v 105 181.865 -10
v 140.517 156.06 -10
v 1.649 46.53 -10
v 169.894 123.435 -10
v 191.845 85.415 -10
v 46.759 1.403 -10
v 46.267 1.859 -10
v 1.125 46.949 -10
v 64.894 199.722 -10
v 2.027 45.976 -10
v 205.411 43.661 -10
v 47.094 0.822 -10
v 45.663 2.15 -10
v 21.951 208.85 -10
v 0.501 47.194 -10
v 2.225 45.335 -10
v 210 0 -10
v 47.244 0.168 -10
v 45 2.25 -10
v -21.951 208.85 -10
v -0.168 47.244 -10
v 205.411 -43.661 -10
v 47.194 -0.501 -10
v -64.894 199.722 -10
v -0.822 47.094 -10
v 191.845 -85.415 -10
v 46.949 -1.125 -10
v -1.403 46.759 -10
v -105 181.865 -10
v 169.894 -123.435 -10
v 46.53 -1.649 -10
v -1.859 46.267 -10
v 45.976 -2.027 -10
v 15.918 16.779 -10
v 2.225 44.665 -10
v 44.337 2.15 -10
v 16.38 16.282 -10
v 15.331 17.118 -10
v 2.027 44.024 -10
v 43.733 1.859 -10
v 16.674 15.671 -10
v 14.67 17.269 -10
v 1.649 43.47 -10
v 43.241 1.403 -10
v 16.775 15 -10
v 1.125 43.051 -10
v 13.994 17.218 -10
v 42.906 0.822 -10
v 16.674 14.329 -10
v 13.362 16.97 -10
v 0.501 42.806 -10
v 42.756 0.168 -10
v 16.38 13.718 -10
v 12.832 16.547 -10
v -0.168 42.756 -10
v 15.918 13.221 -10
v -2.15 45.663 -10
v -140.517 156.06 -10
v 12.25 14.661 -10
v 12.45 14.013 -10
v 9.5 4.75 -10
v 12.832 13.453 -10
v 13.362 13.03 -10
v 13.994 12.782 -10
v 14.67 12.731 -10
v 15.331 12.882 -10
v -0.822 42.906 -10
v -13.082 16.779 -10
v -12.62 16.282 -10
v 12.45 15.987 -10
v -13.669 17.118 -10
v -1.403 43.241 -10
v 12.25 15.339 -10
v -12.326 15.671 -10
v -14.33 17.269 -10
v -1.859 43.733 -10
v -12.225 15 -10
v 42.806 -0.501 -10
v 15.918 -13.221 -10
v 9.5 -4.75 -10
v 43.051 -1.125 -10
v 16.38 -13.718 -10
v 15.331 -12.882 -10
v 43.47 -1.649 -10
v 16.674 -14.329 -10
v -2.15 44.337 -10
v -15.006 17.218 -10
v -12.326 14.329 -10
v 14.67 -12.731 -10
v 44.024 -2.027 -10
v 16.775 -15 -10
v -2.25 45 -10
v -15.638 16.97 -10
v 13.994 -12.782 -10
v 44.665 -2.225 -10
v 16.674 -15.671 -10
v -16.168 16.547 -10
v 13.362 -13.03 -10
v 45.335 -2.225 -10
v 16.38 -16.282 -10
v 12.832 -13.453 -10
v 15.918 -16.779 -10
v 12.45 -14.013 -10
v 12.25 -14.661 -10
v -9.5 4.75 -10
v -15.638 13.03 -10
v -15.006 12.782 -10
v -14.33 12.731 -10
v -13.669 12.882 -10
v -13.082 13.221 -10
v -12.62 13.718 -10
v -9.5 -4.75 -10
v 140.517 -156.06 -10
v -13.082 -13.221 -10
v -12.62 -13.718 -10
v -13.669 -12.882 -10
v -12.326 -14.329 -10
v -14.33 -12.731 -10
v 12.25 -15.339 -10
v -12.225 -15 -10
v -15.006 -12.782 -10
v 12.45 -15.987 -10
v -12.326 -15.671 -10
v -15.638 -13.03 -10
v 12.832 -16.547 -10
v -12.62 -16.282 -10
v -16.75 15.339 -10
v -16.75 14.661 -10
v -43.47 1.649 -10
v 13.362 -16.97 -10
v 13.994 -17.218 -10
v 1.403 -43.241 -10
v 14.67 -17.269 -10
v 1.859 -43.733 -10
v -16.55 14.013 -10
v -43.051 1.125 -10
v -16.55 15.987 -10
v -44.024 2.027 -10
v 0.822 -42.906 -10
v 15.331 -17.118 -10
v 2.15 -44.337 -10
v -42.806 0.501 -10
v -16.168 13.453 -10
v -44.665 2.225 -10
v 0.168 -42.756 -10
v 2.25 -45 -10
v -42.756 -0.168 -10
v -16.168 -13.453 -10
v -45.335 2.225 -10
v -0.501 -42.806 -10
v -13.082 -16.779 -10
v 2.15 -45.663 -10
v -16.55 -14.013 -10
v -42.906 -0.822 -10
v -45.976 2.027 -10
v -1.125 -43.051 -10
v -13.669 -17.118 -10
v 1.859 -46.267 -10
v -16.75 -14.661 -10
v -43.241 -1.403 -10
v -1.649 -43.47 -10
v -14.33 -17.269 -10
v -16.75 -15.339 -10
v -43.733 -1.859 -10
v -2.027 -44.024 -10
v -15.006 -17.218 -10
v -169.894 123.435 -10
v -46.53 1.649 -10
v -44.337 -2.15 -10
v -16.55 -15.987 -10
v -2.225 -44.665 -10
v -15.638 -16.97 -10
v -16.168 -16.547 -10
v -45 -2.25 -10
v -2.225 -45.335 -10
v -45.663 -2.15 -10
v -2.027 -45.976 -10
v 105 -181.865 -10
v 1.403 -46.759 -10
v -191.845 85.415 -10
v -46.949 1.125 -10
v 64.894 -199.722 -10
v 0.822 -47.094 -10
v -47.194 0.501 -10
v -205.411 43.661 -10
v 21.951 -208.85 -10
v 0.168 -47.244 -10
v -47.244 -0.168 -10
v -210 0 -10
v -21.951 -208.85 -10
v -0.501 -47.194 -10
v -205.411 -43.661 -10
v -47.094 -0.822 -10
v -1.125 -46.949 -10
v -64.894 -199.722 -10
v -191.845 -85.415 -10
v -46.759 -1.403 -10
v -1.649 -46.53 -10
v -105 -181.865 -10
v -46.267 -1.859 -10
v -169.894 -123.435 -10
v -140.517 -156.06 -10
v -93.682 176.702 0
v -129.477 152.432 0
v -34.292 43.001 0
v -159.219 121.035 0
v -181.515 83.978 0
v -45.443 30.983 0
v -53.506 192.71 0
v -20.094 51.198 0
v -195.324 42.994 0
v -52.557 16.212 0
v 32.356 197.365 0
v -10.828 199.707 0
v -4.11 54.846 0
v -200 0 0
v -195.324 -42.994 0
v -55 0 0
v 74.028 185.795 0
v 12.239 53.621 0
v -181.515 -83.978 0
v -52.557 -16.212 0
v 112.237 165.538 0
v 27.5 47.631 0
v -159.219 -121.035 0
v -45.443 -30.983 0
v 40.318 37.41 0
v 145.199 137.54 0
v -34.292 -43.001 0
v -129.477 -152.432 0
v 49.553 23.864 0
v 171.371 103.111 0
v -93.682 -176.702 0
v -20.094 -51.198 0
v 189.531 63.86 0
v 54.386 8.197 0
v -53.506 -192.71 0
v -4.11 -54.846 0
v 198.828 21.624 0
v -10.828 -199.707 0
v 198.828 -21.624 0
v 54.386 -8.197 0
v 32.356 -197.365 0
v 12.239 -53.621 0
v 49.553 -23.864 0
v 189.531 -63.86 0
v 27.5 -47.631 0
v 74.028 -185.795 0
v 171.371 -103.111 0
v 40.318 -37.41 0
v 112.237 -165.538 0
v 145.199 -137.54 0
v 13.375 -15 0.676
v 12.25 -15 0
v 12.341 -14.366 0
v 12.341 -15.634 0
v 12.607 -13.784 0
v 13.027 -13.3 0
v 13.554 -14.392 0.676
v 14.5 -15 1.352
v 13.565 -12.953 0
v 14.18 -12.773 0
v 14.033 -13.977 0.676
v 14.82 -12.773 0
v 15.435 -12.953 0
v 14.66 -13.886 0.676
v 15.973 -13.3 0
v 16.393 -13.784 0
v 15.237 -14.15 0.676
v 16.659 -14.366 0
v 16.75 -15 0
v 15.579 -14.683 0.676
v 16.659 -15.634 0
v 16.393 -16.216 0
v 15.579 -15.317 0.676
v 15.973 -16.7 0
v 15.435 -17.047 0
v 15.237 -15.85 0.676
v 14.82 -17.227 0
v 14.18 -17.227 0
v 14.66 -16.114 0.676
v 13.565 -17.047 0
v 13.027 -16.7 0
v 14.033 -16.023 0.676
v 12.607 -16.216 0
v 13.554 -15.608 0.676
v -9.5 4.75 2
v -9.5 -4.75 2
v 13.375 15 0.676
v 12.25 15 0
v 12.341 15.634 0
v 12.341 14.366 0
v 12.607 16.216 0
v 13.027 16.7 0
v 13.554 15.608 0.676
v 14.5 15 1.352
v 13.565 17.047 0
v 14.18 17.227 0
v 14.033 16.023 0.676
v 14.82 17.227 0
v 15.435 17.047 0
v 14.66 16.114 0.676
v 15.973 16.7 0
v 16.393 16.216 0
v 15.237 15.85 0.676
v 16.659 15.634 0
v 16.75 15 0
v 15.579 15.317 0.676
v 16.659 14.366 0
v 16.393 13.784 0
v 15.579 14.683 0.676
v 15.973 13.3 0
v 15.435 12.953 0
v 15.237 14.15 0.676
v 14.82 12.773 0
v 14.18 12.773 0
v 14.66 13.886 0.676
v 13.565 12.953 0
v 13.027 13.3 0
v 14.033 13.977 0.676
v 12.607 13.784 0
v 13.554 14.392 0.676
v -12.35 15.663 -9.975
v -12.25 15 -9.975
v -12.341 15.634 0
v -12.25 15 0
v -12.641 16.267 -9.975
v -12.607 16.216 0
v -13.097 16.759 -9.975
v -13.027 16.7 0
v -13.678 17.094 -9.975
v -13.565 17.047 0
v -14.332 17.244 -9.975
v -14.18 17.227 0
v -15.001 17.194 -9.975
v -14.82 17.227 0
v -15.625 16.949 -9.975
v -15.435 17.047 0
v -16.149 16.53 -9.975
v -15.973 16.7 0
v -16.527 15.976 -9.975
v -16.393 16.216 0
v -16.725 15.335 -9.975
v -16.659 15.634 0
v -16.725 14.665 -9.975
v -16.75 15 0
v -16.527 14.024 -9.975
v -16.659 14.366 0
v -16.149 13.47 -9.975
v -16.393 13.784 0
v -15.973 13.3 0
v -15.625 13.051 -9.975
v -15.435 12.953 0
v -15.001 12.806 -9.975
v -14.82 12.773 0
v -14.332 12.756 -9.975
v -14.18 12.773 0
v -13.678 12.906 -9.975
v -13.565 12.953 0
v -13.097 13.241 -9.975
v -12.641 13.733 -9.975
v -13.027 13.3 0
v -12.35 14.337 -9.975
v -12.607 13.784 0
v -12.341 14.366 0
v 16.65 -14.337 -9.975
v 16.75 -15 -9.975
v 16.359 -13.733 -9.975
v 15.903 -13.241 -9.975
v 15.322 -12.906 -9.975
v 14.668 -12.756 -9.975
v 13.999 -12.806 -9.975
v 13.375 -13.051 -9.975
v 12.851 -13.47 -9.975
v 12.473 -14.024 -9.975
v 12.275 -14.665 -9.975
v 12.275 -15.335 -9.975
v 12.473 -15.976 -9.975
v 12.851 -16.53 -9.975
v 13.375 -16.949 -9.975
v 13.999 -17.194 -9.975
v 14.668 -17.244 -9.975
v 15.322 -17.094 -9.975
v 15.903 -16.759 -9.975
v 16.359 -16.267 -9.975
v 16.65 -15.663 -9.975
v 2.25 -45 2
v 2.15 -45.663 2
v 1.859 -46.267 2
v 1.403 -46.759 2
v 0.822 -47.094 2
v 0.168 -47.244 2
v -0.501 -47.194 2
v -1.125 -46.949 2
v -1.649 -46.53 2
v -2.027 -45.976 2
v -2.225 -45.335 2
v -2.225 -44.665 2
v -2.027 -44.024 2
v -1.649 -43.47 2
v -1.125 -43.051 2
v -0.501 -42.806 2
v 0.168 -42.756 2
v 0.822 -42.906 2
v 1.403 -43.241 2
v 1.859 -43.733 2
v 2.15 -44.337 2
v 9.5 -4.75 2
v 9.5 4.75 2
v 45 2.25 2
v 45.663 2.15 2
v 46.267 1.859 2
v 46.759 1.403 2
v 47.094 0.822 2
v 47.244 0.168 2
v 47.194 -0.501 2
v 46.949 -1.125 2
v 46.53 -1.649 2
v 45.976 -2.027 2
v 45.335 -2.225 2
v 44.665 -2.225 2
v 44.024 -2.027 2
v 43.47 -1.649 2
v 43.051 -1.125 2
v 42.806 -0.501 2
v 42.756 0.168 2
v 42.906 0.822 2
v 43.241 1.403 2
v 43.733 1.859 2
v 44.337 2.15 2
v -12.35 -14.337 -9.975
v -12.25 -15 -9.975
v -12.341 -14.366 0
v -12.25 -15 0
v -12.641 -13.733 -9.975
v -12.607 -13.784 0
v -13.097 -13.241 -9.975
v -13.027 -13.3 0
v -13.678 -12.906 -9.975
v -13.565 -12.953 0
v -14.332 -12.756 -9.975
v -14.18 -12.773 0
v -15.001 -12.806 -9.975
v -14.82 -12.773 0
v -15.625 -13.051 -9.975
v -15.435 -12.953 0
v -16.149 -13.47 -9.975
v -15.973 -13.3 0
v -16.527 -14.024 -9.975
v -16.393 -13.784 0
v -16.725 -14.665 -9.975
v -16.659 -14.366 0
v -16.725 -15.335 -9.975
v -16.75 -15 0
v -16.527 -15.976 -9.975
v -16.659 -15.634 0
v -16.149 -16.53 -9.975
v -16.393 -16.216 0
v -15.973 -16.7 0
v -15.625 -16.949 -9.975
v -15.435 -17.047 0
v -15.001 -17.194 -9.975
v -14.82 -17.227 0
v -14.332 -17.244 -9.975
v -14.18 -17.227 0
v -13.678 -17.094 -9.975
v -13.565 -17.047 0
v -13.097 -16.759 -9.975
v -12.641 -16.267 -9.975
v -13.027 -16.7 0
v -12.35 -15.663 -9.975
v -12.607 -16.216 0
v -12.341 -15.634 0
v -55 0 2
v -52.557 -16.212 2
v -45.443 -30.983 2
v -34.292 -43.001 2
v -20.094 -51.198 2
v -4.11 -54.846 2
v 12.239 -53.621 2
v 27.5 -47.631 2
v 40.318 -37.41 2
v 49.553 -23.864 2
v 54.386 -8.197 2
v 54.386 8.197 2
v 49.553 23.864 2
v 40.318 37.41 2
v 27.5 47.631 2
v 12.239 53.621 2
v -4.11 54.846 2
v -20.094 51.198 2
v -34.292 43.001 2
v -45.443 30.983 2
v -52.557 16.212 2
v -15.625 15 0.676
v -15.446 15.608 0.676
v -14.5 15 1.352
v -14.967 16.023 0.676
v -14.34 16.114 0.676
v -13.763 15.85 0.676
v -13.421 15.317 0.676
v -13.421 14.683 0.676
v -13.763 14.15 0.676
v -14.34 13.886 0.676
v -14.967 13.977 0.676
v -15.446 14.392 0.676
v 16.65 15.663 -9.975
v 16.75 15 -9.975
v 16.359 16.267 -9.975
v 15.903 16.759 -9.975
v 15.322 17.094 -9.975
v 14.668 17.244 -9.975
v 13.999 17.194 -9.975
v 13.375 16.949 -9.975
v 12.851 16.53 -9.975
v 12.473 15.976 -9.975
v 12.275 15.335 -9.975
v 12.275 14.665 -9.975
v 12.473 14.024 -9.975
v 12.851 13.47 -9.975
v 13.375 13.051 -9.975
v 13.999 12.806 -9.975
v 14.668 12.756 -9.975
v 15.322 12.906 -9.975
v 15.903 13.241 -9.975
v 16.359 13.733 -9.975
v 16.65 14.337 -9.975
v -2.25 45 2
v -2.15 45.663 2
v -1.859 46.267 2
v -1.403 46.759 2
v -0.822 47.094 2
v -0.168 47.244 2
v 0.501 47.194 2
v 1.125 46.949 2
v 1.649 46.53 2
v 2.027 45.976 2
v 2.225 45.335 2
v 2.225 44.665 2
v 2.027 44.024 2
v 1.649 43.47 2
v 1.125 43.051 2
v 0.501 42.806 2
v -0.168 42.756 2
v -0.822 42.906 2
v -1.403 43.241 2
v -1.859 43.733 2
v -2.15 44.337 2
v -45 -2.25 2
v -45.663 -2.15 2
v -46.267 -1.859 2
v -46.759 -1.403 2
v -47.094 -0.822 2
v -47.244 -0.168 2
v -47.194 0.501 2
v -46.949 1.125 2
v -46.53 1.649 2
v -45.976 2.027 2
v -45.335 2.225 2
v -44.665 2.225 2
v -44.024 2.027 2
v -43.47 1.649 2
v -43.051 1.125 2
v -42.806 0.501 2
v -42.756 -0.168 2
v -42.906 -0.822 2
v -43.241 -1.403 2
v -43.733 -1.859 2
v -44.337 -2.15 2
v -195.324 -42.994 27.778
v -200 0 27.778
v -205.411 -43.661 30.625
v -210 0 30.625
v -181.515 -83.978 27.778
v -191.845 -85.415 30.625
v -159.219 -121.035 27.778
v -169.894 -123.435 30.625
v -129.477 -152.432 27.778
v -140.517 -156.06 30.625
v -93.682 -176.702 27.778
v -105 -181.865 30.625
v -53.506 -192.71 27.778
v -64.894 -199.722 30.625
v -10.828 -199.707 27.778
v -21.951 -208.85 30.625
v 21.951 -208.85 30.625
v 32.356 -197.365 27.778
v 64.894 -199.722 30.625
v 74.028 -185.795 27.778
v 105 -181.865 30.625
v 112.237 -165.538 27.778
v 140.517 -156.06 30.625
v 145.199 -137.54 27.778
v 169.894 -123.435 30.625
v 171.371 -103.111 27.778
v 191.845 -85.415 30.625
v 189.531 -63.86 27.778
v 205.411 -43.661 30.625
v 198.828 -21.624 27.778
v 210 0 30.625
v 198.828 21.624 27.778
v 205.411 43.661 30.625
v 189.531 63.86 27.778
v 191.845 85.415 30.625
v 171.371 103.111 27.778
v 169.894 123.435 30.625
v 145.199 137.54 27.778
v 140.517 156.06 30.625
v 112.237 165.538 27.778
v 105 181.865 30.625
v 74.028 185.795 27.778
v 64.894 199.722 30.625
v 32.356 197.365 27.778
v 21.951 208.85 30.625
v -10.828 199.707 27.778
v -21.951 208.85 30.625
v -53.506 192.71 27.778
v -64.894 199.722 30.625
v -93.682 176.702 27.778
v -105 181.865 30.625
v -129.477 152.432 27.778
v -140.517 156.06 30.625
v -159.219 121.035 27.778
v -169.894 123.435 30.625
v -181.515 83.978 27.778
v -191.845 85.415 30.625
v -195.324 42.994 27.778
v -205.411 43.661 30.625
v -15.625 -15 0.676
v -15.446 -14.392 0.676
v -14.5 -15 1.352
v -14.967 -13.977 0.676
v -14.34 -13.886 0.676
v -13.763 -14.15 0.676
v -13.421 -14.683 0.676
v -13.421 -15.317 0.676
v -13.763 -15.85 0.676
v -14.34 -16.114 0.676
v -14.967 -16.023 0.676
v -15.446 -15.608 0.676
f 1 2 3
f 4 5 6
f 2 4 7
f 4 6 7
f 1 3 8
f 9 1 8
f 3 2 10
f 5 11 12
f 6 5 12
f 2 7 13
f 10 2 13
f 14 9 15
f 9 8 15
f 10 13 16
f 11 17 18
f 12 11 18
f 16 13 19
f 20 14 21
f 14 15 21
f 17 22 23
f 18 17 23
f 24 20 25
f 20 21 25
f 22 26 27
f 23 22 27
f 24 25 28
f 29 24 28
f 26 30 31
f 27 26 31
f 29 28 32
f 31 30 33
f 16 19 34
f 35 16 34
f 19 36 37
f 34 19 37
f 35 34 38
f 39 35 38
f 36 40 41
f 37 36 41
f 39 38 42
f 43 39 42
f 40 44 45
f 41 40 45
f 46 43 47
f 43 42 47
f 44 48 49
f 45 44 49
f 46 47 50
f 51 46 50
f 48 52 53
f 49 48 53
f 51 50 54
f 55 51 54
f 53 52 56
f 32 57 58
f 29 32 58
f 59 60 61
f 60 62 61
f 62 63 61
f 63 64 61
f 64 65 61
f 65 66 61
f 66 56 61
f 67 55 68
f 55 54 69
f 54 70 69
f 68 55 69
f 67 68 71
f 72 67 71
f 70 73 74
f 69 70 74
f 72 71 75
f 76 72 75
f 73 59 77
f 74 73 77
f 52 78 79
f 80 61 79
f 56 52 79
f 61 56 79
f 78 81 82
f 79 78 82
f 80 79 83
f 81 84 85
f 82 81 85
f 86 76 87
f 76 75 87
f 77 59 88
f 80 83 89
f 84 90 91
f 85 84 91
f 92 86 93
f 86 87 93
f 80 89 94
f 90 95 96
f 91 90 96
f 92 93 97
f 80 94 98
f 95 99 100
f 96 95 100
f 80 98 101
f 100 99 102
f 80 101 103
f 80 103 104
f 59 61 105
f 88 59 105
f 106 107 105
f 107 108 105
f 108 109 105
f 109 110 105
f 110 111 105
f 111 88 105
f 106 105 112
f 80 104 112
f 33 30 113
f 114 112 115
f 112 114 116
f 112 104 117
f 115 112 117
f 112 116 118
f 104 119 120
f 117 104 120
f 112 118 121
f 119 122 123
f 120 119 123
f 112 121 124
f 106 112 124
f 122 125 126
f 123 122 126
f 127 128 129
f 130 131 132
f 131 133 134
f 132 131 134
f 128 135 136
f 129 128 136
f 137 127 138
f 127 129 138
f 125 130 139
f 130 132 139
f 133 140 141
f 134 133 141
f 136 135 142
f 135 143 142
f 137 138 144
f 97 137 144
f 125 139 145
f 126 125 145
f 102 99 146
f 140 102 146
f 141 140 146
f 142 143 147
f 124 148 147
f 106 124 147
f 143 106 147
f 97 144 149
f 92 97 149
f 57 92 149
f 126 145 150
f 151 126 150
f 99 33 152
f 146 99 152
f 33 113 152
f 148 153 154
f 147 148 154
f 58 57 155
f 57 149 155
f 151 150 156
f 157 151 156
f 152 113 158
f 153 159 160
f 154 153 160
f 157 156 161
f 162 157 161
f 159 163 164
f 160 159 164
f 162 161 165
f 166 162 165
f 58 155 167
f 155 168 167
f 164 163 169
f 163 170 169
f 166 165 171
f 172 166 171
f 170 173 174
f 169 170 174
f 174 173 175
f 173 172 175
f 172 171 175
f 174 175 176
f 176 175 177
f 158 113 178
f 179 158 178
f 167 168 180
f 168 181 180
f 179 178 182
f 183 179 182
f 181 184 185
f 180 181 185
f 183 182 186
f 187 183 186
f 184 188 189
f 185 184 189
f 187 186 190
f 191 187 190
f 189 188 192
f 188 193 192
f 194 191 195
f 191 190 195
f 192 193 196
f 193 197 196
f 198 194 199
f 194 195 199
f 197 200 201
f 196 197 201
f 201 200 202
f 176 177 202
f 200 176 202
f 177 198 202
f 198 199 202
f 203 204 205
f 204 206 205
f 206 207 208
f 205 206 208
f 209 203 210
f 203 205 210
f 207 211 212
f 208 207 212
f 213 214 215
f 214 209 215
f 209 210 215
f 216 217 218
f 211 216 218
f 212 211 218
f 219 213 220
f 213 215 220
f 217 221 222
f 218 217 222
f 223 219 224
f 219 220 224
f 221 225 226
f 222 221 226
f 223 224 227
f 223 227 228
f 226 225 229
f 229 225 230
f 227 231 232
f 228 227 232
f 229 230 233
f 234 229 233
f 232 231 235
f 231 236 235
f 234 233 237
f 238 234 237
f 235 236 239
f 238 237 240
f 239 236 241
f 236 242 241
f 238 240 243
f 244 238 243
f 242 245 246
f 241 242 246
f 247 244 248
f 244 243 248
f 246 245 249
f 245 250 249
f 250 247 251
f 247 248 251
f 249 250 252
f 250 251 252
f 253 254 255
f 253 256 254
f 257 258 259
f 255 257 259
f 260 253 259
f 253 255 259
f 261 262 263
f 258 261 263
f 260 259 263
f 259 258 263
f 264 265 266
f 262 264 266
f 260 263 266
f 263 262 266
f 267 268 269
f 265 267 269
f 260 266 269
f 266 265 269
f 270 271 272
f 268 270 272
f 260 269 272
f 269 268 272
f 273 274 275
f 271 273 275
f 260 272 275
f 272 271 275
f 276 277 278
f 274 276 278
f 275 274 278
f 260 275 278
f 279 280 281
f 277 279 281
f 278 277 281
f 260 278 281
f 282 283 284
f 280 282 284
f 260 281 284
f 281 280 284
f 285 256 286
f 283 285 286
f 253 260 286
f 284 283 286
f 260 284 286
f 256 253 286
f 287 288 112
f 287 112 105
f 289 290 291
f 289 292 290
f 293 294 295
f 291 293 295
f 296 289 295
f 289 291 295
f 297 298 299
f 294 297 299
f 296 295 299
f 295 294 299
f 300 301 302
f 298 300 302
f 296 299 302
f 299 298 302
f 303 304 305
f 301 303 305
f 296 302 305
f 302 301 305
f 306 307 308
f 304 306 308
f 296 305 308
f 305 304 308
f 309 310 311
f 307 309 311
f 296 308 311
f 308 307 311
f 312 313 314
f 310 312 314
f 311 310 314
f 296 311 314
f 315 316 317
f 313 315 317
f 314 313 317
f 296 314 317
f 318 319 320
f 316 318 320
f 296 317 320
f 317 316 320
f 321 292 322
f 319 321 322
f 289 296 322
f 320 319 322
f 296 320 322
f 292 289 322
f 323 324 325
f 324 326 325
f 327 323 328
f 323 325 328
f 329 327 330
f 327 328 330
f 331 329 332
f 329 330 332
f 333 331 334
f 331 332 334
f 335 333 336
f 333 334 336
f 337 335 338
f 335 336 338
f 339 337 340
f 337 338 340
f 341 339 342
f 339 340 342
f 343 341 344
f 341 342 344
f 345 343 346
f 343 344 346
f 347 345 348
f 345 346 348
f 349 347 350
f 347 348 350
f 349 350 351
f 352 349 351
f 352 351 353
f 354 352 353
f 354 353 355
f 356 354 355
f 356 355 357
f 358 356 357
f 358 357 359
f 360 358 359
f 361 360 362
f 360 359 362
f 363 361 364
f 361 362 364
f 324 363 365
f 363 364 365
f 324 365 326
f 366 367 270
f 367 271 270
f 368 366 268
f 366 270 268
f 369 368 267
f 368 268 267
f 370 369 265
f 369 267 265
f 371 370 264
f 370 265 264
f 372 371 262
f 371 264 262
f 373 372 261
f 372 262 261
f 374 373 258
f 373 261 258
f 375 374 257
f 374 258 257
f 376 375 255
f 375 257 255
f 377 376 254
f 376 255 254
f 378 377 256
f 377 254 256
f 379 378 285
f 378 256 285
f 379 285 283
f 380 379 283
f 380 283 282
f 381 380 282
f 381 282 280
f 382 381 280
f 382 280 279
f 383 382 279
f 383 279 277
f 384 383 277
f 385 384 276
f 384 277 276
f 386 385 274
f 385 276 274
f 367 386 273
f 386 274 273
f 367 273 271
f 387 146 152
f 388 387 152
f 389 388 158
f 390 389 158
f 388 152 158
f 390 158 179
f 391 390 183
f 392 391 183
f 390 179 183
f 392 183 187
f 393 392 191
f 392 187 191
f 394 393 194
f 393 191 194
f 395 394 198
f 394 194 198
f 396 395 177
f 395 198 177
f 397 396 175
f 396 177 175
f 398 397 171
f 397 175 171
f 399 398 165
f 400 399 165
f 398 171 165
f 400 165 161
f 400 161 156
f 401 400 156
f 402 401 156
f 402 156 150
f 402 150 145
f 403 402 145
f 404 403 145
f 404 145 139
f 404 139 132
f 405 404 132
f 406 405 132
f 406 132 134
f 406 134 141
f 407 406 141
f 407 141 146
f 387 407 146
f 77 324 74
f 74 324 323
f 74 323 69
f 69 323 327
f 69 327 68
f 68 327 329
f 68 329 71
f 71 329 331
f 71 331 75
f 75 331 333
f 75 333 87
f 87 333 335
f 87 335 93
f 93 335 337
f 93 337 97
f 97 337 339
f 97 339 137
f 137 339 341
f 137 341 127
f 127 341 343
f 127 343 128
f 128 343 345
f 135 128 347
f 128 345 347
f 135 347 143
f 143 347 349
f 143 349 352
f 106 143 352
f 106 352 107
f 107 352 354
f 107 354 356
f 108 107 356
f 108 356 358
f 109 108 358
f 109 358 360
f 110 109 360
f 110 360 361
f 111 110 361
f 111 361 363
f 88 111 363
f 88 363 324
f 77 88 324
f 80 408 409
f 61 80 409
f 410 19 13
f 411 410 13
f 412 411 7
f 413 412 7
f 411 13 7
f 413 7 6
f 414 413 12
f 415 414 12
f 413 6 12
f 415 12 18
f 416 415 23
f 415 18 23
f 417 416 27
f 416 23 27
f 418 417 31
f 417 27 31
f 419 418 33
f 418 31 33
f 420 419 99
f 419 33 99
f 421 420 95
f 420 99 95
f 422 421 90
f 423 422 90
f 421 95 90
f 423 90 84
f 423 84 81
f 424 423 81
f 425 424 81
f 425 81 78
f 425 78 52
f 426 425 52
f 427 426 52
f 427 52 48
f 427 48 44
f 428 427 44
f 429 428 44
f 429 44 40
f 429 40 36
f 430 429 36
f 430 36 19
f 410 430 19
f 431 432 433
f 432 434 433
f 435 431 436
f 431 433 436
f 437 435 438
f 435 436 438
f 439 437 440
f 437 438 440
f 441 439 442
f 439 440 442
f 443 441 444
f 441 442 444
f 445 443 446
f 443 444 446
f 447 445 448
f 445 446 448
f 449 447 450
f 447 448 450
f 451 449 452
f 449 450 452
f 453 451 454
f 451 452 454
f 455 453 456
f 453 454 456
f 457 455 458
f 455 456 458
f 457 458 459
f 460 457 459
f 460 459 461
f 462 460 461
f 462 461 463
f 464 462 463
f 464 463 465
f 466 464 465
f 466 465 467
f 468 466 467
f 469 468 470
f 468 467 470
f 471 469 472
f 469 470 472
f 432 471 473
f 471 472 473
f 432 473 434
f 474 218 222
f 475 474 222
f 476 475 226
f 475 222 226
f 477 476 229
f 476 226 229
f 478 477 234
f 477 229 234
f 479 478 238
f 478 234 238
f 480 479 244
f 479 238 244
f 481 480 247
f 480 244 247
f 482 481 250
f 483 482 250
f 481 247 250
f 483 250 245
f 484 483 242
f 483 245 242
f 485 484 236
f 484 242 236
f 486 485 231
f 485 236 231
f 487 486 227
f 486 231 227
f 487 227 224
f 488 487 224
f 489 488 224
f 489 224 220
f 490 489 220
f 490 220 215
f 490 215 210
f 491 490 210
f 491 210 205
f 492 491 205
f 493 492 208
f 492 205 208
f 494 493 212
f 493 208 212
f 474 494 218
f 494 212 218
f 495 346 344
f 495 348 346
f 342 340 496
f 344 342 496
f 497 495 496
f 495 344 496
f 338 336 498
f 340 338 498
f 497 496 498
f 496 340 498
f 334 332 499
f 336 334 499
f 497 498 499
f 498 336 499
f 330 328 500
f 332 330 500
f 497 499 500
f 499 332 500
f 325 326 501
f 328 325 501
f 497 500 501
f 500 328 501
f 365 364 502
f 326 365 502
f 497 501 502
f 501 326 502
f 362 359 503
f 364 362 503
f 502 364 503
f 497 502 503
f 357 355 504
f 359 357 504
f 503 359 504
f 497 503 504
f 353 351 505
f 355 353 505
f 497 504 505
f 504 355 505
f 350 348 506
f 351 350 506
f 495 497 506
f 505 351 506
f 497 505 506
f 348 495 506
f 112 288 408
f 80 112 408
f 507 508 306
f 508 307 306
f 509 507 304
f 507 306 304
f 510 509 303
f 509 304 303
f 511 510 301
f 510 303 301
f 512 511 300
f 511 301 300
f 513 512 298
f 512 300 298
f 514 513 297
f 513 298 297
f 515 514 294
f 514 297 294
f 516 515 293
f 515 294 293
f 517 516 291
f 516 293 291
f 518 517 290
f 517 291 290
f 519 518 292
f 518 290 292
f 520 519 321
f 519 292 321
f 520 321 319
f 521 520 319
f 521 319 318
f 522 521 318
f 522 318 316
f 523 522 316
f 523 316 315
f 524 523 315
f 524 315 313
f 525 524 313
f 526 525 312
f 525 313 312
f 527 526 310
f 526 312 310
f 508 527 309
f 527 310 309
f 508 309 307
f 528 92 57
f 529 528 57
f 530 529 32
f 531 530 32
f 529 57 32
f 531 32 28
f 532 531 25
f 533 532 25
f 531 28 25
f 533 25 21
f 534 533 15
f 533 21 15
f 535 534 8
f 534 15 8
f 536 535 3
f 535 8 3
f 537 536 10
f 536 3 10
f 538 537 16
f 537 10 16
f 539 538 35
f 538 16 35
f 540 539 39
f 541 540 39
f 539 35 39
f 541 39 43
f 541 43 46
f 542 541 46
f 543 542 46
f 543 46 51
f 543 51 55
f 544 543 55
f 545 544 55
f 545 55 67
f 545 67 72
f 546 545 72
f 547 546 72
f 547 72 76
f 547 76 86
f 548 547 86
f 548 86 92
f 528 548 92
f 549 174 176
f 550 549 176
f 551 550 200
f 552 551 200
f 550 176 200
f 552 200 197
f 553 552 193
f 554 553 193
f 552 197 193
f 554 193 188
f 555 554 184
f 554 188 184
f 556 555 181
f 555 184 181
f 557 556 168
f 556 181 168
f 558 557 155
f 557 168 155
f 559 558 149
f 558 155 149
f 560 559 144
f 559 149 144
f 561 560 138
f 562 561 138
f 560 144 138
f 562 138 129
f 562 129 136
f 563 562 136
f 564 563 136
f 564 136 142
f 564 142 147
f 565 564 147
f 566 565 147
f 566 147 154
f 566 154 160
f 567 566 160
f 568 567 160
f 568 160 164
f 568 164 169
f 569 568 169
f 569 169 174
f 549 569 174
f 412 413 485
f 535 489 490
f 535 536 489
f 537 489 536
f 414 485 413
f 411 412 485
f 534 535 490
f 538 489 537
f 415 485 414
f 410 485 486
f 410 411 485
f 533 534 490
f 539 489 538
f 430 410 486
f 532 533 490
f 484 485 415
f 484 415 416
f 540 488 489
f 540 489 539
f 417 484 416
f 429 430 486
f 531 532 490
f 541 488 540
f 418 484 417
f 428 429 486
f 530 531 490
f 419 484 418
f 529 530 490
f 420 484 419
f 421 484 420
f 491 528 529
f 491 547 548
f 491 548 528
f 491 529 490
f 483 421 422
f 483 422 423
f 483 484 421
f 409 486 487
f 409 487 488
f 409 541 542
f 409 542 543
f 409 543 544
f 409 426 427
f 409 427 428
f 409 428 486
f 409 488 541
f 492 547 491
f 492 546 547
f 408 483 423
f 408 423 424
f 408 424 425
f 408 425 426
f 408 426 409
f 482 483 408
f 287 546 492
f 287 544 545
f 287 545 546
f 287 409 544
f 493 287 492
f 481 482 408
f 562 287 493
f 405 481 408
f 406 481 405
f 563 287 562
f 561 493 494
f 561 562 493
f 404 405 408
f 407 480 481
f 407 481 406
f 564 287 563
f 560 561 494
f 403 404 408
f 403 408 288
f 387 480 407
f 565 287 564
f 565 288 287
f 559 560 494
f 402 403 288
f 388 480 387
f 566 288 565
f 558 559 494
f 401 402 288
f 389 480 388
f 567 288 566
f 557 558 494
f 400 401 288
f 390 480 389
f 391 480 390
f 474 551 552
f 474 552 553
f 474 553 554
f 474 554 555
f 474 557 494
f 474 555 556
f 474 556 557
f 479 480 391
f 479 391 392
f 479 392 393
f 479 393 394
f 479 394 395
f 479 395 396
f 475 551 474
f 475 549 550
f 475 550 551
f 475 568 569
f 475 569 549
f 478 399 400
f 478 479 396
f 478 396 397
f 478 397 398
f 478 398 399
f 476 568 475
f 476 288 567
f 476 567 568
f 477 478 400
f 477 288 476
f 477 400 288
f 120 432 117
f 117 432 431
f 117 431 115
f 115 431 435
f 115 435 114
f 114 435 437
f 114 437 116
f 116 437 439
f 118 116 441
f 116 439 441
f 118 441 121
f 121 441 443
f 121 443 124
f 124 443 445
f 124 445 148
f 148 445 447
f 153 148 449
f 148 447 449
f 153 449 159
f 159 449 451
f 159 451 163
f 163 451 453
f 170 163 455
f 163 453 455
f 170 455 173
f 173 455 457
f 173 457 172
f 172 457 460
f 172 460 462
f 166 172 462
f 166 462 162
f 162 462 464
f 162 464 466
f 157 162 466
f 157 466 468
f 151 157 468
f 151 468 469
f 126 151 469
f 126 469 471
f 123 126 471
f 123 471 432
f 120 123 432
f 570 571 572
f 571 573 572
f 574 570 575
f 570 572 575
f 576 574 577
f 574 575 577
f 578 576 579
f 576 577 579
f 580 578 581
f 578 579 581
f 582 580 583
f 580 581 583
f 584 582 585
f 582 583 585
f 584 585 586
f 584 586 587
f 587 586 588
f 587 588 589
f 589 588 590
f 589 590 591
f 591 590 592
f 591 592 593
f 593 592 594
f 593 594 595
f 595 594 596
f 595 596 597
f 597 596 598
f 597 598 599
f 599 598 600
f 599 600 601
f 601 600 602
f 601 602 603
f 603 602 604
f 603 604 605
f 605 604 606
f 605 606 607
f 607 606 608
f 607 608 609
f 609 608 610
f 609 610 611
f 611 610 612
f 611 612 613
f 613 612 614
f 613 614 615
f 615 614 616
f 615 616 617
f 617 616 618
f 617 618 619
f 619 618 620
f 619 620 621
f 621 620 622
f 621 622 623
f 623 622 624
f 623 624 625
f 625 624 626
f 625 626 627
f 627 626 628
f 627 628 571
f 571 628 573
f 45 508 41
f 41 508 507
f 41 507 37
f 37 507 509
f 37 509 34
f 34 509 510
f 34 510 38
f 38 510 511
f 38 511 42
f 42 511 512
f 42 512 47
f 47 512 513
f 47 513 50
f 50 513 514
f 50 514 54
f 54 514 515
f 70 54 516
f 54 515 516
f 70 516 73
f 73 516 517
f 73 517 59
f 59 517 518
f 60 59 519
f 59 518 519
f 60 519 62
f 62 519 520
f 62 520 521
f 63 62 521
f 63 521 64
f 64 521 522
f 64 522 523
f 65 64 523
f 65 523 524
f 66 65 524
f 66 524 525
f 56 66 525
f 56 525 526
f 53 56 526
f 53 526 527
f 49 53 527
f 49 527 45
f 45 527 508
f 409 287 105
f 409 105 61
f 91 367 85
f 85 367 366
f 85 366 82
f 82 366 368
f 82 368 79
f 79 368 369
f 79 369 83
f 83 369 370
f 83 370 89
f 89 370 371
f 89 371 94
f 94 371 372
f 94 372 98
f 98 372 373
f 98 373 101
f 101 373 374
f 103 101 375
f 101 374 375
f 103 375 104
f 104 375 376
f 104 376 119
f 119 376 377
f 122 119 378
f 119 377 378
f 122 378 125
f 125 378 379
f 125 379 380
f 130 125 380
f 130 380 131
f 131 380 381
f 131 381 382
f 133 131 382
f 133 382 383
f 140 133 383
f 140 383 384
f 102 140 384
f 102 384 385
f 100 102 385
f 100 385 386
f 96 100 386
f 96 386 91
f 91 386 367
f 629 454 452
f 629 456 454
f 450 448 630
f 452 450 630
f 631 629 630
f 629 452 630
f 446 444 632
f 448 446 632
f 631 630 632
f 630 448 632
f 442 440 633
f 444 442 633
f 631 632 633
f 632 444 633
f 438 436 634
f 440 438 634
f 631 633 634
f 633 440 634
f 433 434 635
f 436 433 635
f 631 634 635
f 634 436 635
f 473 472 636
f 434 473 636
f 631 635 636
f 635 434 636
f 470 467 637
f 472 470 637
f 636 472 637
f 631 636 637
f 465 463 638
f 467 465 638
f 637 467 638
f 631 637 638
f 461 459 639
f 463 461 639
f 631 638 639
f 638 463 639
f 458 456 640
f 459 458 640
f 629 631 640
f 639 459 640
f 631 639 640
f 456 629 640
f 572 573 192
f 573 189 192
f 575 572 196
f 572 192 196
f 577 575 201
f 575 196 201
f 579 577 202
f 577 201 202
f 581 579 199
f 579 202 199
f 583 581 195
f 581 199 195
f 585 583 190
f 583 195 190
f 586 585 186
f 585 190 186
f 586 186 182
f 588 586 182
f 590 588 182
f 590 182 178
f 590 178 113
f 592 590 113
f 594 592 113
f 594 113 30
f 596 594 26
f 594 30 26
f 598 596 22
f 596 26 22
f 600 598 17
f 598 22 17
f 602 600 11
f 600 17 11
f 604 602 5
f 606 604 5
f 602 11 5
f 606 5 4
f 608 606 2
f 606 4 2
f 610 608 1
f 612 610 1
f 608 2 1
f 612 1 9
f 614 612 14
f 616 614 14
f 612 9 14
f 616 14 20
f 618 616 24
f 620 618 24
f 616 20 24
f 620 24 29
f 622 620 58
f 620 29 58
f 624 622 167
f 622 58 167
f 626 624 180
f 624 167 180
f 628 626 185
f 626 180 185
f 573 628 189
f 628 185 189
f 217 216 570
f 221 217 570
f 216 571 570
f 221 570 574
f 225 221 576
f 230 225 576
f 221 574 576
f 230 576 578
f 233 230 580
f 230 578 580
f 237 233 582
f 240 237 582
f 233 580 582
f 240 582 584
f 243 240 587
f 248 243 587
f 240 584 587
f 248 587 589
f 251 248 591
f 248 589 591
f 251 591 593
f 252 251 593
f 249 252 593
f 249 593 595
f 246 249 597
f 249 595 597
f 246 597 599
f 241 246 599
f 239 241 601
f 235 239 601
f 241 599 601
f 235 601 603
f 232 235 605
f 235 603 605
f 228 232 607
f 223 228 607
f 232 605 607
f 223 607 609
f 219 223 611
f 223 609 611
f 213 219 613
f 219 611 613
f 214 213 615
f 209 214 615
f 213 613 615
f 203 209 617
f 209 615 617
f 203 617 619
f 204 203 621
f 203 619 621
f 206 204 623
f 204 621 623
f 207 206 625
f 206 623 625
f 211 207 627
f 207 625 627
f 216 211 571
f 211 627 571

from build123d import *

# Parameters (mm, degrees)
CUT_EXTRUDE_1_DEPTH         = 299.559693571
CUT_EXTRUDE_1_DEPTH_BACK    = 299.559693571
SKETCH_2_W                  = 19
SKETCH_2_H                  = 9.5
SKETCH_3_R                  = 55
EXTRUDE_1_DEPTH             = 2
SKETCH_4_W                  = 19
SKETCH_4_H                  = 9.5
CUT_EXTRUDE_2_DEPTH         = 2
HOLE_WIZARD_M41_D           = 4.5
PATTERN_CIRCULAR_1_COUNT    = 4
HOLE_WIZARD_M42_D           = 4.5
HOLE_WIZARD_M42_DEPTH       = 10
HOLE_WIZARD_M42_CSINK_D     = 4.55
HOLE_WIZARD_M42_CSINK_ANGLE = 90
HOLE_WIZARD_M42_TIP         = 1.351936393


with BuildPart() as part:
    # Эскиз1 → Повернуть1 (revolve)
    with BuildSketch(Plane(origin=(0, 0, 0), x_dir=(1, 0, 0), z_dir=(0, 1, 0))):
        Polygon((0, 0), (200, 0), (200, -27.777777778), (210, -30.625), (210, 10), (0, 10), align=None)
    revolve(axis=Axis((0, 0, -10), (0, 0, 1)))

    # Эскиз2 → Вырез-Вытянуть1 (cut, two sides: drawn at the far end of the back side and taken through both)
    with BuildSketch(Plane.XY.offset(-CUT_EXTRUDE_1_DEPTH_BACK)):
        Rectangle(SKETCH_2_W, SKETCH_2_H)
    extrude(amount=CUT_EXTRUDE_1_DEPTH + CUT_EXTRUDE_1_DEPTH_BACK, mode=Mode.SUBTRACT)

    # Эскиз3 → Бобышка-Вытянуть1 (add)
    with BuildSketch(Plane.XY):
        Circle(SKETCH_3_R)
    extrude(amount=EXTRUDE_1_DEPTH)

    # Эскиз4 → Вырез-Вытянуть2 (cut)
    with BuildSketch(Plane.XY.offset(2)):
        Rectangle(SKETCH_4_W, SKETCH_4_H)
    extrude(amount=-CUT_EXTRUDE_2_DEPTH, mode=Mode.SUBTRACT)

    # Отверстие с зазором M41 (through all)
    with Locations(Plane(origin=(0, 45, 2), x_dir=(1, 0, 0), z_dir=(0, 0, 1))):
        with Locations((0, 0)):
            hole_wizard_m41 = Hole(HOLE_WIZARD_M41_D / 2)

    # Круговой массив1: Отверстие с зазором M41 ×4 about axis
    pattern_circular_1_axis = Axis((0, 0, 0), (0, 0, 1))
    for i in range(1, PATTERN_CIRCULAR_1_COUNT):
        add(hole_wizard_m41.rotate(pattern_circular_1_axis, i * 360 / PATTERN_CIRCULAR_1_COUNT), mode=Mode.SUBTRACT)

    # Отверстие с зазором M42
    with Locations(Plane(origin=(-14.5, 15, -10), x_dir=(-1, 0, 0), z_dir=(0, 0, -1))):
        with Locations((0, 0), (-29, 0), (-29, -30), (0, -30)):
            CounterSinkHole(HOLE_WIZARD_M42_D / 2, HOLE_WIZARD_M42_CSINK_D / 2, depth=HOLE_WIZARD_M42_DEPTH, counter_sink_angle=HOLE_WIZARD_M42_CSINK_ANGLE)
            with Locations((0, 0, -(HOLE_WIZARD_M42_DEPTH + HOLE_WIZARD_M42_TIP / 2))):  # 118° drill point
                Cone(0, HOLE_WIZARD_M42_D / 2, HOLE_WIZARD_M42_TIP, mode=Mode.SUBTRACT)


solid = part.part
